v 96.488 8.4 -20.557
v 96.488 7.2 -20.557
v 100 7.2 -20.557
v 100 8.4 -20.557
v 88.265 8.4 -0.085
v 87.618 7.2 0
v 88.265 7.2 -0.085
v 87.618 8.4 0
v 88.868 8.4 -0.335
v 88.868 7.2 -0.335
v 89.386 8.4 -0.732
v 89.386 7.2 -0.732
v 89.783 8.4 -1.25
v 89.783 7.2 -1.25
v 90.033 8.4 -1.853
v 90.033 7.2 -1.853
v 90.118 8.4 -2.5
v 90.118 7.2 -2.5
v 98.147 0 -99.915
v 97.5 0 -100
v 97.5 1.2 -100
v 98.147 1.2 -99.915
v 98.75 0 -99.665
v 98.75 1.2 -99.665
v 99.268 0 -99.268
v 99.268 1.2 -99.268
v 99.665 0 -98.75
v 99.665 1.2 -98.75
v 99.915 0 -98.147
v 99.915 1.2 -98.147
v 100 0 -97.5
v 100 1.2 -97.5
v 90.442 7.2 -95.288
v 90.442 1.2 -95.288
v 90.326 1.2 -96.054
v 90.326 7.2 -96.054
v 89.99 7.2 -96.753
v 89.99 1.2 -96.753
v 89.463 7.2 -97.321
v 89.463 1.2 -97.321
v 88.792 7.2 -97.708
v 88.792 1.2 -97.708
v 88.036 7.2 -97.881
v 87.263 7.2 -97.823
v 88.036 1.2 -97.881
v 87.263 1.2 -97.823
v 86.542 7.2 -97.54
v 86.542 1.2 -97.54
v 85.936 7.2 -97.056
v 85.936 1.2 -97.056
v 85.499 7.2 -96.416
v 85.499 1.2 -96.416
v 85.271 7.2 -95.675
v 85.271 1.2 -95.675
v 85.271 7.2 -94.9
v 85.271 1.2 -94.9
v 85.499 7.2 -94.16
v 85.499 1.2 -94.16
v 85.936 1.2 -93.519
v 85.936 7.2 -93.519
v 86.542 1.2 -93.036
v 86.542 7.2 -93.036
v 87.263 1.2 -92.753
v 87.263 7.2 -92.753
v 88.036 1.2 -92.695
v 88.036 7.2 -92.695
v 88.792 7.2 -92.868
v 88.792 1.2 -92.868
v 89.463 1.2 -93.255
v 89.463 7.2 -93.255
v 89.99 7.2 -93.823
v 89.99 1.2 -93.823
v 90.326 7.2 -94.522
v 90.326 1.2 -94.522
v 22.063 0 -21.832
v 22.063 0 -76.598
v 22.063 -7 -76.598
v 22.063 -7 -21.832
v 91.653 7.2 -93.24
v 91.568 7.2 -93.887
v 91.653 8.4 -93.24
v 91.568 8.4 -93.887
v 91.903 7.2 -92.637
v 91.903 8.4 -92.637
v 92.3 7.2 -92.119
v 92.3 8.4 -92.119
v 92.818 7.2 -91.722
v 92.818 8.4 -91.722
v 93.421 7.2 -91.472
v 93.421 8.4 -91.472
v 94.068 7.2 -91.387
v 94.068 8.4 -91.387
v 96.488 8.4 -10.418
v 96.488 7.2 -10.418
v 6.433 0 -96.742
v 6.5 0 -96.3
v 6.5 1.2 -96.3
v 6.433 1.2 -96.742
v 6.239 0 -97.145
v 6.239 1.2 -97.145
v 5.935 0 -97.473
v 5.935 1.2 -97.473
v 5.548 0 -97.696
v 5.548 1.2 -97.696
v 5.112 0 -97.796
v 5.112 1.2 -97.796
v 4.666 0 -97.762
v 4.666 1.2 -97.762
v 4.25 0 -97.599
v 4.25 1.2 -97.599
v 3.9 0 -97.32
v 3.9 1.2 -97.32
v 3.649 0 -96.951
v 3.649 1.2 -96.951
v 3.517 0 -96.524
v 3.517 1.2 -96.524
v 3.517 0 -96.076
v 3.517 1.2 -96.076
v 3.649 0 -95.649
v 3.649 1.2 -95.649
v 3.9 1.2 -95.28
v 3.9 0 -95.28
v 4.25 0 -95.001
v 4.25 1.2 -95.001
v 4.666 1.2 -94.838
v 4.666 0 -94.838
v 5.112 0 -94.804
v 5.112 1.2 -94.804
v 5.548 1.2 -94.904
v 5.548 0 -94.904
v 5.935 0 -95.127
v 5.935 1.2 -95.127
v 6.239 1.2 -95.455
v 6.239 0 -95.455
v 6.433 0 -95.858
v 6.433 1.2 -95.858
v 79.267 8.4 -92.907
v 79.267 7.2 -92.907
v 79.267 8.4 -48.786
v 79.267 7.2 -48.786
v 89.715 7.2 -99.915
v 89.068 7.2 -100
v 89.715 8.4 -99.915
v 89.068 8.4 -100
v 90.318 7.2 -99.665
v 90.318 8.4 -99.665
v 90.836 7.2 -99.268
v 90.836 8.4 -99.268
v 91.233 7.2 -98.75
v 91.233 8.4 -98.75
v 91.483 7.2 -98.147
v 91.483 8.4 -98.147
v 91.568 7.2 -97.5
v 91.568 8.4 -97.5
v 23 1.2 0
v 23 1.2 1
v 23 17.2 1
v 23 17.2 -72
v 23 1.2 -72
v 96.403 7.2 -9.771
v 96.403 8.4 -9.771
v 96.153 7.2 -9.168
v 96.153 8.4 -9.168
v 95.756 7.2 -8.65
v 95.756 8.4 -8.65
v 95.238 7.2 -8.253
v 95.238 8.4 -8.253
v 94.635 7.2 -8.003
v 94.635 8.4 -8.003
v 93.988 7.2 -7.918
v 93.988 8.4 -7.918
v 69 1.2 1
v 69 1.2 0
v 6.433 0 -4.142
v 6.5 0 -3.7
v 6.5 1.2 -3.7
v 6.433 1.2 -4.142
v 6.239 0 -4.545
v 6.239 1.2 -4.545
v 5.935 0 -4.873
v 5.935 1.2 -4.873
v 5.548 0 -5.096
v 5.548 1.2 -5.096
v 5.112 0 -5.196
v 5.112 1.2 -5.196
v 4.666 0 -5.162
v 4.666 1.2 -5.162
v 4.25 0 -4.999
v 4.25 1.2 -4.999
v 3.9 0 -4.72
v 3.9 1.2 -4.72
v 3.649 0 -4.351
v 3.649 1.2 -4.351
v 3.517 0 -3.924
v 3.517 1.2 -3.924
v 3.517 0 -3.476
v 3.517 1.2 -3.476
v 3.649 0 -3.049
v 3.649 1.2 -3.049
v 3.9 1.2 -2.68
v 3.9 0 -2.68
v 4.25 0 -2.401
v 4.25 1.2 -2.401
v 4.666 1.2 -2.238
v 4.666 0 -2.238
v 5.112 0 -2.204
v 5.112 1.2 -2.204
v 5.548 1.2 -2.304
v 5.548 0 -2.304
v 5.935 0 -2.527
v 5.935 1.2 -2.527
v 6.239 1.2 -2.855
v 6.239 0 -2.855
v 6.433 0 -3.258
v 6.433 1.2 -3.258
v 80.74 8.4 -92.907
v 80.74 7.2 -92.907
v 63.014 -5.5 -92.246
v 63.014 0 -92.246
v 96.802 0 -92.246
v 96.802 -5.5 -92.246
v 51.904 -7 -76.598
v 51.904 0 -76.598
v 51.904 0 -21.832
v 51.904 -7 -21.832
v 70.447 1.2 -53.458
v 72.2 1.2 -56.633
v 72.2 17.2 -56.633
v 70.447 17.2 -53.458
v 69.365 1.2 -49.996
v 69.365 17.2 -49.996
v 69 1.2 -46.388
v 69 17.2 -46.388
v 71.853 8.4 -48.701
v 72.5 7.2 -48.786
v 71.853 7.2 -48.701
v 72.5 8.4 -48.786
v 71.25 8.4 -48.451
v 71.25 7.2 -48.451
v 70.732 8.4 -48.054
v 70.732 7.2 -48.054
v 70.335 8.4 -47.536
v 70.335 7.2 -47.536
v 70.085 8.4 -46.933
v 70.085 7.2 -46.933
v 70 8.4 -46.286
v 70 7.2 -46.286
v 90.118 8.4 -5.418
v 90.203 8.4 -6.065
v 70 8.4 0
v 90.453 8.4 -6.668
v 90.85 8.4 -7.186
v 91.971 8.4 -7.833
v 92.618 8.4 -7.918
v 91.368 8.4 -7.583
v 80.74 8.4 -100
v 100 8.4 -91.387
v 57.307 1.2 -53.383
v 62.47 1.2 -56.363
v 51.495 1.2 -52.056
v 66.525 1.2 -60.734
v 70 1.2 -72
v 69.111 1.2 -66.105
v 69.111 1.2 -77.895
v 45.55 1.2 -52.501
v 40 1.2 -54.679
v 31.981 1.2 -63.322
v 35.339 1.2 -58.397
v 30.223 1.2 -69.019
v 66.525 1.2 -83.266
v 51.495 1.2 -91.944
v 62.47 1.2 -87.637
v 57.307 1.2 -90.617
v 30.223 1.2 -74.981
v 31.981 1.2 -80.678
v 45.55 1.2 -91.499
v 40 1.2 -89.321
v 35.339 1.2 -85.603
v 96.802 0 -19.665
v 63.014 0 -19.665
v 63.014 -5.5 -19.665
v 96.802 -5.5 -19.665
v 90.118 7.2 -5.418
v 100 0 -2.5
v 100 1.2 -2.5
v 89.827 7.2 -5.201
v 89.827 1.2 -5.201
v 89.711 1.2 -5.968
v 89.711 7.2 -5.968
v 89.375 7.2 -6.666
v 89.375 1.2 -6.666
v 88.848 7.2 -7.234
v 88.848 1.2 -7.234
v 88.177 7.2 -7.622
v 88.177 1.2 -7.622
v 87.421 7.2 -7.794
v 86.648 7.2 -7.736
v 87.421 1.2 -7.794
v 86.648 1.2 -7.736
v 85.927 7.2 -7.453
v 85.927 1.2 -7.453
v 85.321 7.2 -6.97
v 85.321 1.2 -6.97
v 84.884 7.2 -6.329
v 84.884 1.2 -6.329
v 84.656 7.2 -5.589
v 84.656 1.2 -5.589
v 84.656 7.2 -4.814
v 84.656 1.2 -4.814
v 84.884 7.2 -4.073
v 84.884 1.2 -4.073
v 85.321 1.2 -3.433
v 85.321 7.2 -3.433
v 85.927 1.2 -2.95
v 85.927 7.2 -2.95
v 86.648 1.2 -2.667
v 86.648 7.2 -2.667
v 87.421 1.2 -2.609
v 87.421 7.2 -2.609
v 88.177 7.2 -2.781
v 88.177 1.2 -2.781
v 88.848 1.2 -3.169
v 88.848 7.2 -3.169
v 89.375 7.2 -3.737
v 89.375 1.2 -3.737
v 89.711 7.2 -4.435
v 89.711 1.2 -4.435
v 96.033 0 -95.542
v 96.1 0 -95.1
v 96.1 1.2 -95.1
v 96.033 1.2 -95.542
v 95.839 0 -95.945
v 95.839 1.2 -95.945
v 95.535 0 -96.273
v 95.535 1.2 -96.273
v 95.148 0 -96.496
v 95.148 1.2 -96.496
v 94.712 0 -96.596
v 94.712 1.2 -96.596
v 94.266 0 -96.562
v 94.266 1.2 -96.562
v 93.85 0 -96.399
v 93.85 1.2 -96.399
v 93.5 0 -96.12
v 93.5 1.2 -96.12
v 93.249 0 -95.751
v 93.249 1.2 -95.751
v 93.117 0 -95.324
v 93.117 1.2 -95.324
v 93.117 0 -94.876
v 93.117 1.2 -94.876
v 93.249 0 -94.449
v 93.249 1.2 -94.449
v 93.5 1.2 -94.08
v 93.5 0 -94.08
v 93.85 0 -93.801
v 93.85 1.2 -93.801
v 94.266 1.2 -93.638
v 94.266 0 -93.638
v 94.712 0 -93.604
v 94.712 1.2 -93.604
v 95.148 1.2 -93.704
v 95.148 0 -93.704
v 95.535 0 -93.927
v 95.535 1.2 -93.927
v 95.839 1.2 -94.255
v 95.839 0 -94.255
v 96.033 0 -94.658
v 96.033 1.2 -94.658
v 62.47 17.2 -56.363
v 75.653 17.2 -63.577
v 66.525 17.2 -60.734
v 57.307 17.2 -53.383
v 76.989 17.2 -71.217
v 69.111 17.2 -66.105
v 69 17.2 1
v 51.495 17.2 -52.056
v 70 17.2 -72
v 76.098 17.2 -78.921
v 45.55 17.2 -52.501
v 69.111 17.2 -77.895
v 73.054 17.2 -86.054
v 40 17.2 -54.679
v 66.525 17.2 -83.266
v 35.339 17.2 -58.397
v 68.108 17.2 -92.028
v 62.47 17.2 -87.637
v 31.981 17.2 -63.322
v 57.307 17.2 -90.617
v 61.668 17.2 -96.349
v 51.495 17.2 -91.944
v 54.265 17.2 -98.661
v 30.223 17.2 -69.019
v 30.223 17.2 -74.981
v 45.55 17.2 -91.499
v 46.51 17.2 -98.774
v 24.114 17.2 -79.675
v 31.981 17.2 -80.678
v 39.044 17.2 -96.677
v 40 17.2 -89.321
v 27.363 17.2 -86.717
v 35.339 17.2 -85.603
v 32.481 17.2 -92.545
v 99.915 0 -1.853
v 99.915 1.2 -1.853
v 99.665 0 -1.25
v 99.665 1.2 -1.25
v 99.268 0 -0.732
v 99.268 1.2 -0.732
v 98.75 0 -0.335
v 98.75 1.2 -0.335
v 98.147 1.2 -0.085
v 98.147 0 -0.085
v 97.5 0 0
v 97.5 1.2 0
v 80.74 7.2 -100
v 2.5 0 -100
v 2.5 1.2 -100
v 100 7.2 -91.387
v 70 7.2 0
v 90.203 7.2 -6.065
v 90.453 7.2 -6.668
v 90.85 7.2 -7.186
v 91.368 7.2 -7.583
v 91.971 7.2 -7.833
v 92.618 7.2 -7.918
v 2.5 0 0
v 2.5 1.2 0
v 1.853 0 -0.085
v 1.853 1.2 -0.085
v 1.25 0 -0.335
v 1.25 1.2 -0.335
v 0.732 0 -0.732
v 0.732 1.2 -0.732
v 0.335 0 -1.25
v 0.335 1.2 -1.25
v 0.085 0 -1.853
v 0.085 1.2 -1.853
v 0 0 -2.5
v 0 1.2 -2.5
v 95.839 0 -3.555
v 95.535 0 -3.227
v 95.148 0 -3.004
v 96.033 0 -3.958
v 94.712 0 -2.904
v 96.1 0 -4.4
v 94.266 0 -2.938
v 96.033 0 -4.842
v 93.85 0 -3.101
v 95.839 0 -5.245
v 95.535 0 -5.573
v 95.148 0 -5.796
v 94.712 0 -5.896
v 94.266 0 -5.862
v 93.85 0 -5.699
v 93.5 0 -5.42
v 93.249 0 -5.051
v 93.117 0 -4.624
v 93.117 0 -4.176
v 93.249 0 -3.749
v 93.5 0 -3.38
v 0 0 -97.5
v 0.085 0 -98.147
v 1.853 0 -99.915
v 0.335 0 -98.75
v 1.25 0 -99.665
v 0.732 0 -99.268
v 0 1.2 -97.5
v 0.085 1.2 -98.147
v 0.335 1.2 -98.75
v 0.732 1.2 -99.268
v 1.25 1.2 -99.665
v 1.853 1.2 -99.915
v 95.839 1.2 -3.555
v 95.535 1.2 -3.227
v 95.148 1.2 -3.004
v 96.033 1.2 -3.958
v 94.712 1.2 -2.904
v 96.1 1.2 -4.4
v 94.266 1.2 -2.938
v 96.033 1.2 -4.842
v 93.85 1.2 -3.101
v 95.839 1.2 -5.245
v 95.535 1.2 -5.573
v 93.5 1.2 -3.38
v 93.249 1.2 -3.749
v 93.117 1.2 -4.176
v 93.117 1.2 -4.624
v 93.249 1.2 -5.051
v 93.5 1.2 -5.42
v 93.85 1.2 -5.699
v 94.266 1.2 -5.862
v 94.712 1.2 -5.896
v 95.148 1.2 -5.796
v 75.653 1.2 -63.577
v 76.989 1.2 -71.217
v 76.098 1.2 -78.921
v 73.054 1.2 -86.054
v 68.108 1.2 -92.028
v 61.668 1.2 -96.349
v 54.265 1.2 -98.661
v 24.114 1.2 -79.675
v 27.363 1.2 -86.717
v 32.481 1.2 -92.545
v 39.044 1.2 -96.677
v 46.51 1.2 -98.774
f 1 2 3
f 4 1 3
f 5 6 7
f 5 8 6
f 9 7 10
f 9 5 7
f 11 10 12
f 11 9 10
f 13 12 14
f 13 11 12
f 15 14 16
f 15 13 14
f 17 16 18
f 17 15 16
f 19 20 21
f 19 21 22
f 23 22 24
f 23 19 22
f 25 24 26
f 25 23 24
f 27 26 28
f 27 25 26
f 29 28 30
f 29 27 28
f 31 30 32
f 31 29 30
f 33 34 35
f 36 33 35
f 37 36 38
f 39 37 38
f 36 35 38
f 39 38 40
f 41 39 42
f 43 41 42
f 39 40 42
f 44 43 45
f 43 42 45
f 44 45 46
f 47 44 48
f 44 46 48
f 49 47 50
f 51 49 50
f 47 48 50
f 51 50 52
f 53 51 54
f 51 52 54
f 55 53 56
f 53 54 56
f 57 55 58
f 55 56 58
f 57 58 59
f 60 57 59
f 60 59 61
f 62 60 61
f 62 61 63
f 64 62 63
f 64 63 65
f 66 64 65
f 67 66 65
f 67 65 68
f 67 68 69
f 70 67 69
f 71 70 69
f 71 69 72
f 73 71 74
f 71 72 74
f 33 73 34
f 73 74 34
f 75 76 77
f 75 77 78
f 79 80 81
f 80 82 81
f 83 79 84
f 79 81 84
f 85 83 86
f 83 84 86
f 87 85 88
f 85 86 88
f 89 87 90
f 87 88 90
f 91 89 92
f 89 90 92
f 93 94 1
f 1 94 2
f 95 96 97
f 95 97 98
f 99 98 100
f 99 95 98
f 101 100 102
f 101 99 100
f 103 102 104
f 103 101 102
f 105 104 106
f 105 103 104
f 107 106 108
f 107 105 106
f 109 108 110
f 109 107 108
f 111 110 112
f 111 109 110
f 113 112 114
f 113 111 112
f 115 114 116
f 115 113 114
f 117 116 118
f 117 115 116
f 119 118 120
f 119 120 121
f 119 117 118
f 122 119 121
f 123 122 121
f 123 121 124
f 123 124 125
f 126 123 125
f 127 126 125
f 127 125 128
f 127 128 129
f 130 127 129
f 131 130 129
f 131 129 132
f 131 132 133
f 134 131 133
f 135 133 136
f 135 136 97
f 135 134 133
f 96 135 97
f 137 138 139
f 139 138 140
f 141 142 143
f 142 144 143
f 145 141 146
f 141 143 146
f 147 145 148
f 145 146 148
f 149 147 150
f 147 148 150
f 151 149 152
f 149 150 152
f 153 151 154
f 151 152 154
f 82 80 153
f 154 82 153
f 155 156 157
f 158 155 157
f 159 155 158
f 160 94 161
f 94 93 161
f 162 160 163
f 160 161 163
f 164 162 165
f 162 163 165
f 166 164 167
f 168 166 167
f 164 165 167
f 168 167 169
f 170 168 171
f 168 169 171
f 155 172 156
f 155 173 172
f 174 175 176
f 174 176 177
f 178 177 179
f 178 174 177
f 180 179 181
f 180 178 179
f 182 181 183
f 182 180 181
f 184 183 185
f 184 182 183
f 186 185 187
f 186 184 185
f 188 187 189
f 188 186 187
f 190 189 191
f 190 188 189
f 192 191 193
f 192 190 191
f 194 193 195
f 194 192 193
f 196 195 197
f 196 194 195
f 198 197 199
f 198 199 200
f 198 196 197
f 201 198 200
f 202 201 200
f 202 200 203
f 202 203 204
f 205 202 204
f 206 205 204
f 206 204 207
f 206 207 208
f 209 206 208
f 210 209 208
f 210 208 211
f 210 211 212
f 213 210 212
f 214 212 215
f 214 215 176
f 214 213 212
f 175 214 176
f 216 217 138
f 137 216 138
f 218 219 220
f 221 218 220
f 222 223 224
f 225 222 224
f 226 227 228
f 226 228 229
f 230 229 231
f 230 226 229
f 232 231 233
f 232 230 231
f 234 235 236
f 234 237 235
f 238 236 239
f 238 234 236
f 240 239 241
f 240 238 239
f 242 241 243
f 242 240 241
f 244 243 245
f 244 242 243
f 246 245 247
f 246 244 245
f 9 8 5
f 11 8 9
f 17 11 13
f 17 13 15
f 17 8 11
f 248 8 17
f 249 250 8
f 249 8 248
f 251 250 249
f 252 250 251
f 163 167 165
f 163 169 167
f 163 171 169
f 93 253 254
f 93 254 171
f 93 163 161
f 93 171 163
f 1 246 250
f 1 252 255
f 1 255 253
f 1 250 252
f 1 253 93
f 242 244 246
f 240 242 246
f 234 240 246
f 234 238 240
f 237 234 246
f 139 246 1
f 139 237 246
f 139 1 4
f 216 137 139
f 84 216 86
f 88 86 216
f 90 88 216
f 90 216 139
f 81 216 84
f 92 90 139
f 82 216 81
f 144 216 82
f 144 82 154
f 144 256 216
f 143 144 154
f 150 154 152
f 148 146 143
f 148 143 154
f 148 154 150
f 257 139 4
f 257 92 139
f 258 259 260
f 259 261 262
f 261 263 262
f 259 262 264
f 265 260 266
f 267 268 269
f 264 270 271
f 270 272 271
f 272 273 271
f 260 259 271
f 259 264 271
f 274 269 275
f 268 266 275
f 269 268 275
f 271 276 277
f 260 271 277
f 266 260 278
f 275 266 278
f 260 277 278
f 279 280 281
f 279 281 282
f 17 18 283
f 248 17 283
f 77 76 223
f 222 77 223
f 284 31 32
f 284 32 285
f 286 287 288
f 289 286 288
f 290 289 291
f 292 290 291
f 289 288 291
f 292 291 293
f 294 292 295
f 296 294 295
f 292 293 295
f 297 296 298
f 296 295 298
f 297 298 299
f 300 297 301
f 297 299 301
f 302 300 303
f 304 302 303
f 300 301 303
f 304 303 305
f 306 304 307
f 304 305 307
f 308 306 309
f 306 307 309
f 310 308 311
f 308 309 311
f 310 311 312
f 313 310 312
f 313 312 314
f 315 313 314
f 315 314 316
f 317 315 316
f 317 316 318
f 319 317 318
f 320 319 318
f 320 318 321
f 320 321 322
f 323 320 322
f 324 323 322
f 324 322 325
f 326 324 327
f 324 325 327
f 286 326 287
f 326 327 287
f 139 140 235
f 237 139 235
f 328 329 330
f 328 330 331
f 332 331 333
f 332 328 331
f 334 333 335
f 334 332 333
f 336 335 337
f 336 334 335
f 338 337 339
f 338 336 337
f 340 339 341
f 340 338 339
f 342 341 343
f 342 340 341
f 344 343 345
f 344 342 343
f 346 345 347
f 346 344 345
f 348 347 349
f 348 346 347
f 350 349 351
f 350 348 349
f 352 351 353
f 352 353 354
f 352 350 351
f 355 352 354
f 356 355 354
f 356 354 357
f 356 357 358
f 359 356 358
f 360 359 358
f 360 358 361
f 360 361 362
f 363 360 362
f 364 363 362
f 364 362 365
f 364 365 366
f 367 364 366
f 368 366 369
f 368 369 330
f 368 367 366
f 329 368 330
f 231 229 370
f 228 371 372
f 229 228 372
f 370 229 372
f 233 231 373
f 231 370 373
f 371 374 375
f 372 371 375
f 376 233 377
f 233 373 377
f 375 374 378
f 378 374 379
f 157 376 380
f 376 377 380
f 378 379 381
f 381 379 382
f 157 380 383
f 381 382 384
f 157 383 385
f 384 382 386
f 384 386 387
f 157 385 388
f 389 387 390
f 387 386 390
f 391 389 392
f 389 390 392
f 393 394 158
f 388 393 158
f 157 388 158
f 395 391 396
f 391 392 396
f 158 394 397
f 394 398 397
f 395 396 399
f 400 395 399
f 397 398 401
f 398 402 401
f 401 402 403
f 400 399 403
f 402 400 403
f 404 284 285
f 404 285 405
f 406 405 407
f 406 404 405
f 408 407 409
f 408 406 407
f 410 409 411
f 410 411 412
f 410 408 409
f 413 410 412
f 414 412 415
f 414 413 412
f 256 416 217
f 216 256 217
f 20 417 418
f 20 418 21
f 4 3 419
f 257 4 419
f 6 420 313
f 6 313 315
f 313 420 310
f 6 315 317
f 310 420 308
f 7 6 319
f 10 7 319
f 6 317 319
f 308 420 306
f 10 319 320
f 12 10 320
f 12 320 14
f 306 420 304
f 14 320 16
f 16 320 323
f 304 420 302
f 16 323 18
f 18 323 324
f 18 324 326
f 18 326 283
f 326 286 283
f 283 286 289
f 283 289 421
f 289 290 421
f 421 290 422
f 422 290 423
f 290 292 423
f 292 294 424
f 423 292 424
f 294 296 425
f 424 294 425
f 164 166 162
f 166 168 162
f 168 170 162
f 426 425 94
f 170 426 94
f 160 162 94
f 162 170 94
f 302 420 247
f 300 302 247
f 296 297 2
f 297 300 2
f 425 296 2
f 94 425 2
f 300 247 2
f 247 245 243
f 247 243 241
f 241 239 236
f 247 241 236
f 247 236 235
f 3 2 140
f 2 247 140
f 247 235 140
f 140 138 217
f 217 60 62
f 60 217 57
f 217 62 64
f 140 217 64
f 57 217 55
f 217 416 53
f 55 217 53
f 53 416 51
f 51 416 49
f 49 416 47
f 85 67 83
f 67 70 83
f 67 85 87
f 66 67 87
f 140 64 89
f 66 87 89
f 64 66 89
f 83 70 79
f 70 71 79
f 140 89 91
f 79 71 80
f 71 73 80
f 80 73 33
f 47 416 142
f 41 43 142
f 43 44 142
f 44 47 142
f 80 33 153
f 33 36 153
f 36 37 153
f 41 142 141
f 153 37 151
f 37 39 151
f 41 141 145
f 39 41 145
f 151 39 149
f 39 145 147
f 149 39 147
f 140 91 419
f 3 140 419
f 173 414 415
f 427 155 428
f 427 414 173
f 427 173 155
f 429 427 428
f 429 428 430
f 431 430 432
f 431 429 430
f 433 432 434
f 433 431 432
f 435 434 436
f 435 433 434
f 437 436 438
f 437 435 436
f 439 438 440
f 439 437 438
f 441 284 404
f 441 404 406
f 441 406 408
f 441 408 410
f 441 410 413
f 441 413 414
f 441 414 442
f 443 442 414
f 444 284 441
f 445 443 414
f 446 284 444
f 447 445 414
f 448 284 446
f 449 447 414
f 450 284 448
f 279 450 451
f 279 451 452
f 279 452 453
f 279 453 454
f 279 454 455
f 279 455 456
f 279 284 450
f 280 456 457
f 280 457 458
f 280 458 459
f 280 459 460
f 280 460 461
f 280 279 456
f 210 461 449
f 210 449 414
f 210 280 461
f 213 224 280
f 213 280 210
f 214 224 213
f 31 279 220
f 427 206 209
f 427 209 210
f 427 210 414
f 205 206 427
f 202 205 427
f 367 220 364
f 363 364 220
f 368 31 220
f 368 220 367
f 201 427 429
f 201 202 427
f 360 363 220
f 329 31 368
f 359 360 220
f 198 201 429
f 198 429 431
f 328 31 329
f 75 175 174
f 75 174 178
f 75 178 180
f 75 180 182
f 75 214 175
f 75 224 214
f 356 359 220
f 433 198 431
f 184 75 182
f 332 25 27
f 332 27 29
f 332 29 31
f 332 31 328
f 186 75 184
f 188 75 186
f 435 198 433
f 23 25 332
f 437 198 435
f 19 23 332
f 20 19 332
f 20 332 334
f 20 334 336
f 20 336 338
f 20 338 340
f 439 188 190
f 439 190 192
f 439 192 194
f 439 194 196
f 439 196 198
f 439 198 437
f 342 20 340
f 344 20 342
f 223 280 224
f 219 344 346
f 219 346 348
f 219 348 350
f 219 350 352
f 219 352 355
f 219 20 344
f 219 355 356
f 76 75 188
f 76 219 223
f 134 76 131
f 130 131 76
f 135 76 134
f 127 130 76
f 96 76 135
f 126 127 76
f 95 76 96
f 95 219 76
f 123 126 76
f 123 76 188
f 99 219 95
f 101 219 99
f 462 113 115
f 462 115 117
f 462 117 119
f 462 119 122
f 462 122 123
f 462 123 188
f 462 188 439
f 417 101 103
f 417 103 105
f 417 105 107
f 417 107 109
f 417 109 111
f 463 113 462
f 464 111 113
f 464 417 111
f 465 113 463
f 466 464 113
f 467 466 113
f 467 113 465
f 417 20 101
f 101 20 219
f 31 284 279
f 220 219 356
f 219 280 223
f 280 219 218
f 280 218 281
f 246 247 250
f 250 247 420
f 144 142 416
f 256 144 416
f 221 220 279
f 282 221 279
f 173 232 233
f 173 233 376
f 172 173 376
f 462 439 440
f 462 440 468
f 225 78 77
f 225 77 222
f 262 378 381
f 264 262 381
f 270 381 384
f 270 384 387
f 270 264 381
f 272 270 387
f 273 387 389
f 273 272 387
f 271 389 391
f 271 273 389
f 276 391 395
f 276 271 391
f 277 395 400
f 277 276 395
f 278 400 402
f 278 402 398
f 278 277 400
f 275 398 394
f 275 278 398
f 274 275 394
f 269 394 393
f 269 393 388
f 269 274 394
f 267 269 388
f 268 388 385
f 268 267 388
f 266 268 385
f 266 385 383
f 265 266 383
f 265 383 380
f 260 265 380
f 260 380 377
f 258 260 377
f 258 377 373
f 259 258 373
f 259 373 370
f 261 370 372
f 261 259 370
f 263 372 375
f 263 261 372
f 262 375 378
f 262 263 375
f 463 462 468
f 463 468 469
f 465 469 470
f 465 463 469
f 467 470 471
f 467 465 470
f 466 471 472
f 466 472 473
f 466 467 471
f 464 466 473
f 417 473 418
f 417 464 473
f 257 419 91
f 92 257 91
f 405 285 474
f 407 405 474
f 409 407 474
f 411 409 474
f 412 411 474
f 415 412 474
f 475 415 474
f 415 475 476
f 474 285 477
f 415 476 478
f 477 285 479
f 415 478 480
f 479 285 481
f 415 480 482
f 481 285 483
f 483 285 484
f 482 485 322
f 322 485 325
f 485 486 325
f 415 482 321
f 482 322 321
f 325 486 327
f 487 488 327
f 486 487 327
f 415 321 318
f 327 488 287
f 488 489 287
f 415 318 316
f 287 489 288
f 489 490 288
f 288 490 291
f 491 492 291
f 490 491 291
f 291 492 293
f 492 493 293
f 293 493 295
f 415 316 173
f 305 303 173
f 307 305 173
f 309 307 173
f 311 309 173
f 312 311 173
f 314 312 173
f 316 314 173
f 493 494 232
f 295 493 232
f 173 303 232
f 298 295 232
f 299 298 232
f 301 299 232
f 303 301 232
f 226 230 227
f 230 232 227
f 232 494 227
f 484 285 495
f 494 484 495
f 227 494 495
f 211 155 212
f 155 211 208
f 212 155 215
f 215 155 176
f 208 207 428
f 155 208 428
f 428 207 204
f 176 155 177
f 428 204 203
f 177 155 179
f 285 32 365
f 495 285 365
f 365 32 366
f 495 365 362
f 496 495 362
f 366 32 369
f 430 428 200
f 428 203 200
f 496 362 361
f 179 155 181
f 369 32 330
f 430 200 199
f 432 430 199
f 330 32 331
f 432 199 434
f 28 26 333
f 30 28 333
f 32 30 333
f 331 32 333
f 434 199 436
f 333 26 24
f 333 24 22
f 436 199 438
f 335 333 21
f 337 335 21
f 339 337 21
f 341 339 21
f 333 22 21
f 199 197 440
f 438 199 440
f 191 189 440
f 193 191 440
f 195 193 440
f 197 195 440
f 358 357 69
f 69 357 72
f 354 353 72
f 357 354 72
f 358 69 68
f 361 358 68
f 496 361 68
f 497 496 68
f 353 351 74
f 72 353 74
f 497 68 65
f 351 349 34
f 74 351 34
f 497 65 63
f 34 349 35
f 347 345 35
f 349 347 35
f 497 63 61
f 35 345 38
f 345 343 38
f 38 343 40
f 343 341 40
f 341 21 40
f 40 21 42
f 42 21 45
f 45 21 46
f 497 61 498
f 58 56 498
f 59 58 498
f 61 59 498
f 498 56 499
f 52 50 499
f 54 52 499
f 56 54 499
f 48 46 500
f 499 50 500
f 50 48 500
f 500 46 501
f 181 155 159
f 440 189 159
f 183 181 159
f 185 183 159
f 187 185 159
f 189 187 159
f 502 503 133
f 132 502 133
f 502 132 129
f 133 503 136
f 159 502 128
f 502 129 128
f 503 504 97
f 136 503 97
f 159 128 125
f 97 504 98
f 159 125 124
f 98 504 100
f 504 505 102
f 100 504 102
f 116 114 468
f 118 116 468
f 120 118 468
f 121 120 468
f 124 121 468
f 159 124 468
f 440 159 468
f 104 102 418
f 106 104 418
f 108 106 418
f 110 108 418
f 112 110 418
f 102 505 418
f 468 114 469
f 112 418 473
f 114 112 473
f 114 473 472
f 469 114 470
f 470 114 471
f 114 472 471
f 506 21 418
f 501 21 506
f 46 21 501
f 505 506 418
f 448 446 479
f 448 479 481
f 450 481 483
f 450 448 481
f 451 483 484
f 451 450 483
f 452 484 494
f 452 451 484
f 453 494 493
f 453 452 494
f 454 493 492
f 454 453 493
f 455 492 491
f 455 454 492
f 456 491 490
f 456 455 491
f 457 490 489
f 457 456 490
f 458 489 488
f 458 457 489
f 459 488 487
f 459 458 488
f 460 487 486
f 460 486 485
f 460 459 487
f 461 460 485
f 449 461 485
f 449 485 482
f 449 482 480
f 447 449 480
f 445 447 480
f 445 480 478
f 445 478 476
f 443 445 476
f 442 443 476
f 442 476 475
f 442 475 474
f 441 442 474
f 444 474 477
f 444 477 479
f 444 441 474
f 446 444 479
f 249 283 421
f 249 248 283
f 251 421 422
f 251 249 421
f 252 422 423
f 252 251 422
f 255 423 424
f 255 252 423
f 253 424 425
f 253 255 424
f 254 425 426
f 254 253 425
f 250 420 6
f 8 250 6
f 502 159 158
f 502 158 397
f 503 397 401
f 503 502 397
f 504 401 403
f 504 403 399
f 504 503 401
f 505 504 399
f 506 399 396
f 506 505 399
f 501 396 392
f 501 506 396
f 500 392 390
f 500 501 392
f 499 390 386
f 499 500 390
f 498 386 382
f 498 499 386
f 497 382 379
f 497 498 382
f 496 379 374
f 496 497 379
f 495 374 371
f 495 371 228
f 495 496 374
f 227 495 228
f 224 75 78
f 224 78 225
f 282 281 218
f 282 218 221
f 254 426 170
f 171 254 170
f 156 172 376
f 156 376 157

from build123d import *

# Parameters (mm, degrees)
SKETCH1_R           = 1.5
BOSS_EXTRUDE1_DEPTH = 1.2
SKETCH2_W           = 29.840930046
SKETCH2_H           = 54.765276652
BOSS_EXTRUDE2_DEPTH = 7
SKETCH3_W           = 33.788082064
SKETCH3_H           = 72.581353001
BOSS_EXTRUDE3_DEPTH = 5.5
SKETCH4_R           = 20
BOSS_EXTRUDE4_DEPTH = 16
SKETCH5_R           = 2.6
BOSS_EXTRUDE5_DEPTH = 6
BOSS_EXTRUDE6_DEPTH = 1.2
FILLET1_R           = 2.5


with BuildPart() as part:
    # Sketch1 → Boss-Extrude1 (new body)
    with BuildSketch(Plane(origin=(0, 0, 0), x_dir=(1, 0, 0), z_dir=(0, 1, 0))):
        with BuildLine():
            Line((2.5, 100), (97.5, 100))
            ThreePointArc((97.5, 100), (99.267766953, 99.267766953), (100, 97.5))
            Line((100, 97.5), (100, 2.5))
            ThreePointArc((100, 2.5), (99.267766953, 0.732233047), (97.5, 0))
            Line((97.5, 0), (2.5, 0))
            ThreePointArc((2.5, 0), (0.732233047, 0.732233047), (0, 2.5))
            Line((0, 2.5), (0, 97.5))
            ThreePointArc((0, 97.5), (0.732233047, 99.267766953), (2.5, 100))
        make_face()
        with Locations((5, 96.3)):
            Circle(SKETCH1_R, mode=Mode.SUBTRACT)
        with Locations((94.6, 95.1)):
            Circle(SKETCH1_R, mode=Mode.SUBTRACT)
        with Locations((5, 3.7)):
            Circle(SKETCH1_R, mode=Mode.SUBTRACT)
        with Locations((94.6, 4.4)):
            Circle(SKETCH1_R, mode=Mode.SUBTRACT)
    extrude(amount=BOSS_EXTRUDE1_DEPTH)

    # Sketch2 → Boss-Extrude2 (add)
    with BuildSketch(Plane.XZ):
        with Locations((36.983095354, -49.21487939)):
            Rectangle(SKETCH2_W, SKETCH2_H)
    extrude(amount=BOSS_EXTRUDE2_DEPTH)

    # Sketch3 → Boss-Extrude3 (add)
    with BuildSketch(Plane.XZ):
        with Locations((79.907693041, -55.955425872)):
            Rectangle(SKETCH3_W, SKETCH3_H)
    extrude(amount=BOSS_EXTRUDE3_DEPTH)

    # Sketch4 → Boss-Extrude4 (add)
    with BuildSketch(Plane(origin=(0, 1.2, 0), x_dir=(1, 0, 0), z_dir=(0, 1, 0))):
        with BuildLine():
            Line((23, -1), (23, 72))
            ThreePointArc((23, 72), (58.049844719, 97.772077914), (72.2, 56.63250183))
            ThreePointArc((72.2, 56.63250183), (69.818614724, 51.754066196), (69, 46.38750305))
            Line((69, 46.38750305), (69, -1))
            Line((69, -1), (23, -1))
        make_face()
        with Locations((50, 72)):
            Circle(SKETCH4_R, mode=Mode.SUBTRACT)
    extrude(amount=BOSS_EXTRUDE4_DEPTH)

    # Sketch5 → Boss-Extrude5 (add)
    with BuildSketch(Plane(origin=(0, 1.2, 0), x_dir=(1, 0, 0), z_dir=(0, 1, 0))):
        with Locations((87.841987056, 95.287894157)):
            Circle(SKETCH5_R)
        with Locations((87.226934535, 5.201319217)):
            Circle(SKETCH5_R)
    extrude(amount=BOSS_EXTRUDE5_DEPTH)

    # Sketch6 → Boss-Extrude6 (add)
    with BuildSketch(Plane(origin=(0, 7.2, 0), x_dir=(1, 0, 0), z_dir=(0, 1, 0))):
        Polygon((80.739794291, 100), (80.739794291, 92.907164266), (79.266881022, 92.907164266), (79.266881022, 48.78574174), (70, 48.78574174), (70, 0), (90.117817522, 0), (90.117817522, 7.917821809), (96.488136969, 7.917821809), (96.488136969, 20.556535591), (100, 20.556535591), (100, 91.38711124), (91.568142489, 91.38711124), (91.568142489, 100), align=None)
    extrude(amount=BOSS_EXTRUDE6_DEPTH)

    # Fillet1
    fillet1_edges = [part.edges().sort_by_distance(p)[0] for p in [
        (90.117817522, 7.8, -7.917821809),
        (96.488136969, 7.8, -7.917821809),
        (91.568142489, 7.8, -91.38711124),
        (91.568142489, 7.8, -100),
        (70, 7.8, -48.78574174),
        (90.117817522, 7.8, 0),
    ]]
    fillet(fillet1_edges, radius=FILLET1_R)


solid = part.part
